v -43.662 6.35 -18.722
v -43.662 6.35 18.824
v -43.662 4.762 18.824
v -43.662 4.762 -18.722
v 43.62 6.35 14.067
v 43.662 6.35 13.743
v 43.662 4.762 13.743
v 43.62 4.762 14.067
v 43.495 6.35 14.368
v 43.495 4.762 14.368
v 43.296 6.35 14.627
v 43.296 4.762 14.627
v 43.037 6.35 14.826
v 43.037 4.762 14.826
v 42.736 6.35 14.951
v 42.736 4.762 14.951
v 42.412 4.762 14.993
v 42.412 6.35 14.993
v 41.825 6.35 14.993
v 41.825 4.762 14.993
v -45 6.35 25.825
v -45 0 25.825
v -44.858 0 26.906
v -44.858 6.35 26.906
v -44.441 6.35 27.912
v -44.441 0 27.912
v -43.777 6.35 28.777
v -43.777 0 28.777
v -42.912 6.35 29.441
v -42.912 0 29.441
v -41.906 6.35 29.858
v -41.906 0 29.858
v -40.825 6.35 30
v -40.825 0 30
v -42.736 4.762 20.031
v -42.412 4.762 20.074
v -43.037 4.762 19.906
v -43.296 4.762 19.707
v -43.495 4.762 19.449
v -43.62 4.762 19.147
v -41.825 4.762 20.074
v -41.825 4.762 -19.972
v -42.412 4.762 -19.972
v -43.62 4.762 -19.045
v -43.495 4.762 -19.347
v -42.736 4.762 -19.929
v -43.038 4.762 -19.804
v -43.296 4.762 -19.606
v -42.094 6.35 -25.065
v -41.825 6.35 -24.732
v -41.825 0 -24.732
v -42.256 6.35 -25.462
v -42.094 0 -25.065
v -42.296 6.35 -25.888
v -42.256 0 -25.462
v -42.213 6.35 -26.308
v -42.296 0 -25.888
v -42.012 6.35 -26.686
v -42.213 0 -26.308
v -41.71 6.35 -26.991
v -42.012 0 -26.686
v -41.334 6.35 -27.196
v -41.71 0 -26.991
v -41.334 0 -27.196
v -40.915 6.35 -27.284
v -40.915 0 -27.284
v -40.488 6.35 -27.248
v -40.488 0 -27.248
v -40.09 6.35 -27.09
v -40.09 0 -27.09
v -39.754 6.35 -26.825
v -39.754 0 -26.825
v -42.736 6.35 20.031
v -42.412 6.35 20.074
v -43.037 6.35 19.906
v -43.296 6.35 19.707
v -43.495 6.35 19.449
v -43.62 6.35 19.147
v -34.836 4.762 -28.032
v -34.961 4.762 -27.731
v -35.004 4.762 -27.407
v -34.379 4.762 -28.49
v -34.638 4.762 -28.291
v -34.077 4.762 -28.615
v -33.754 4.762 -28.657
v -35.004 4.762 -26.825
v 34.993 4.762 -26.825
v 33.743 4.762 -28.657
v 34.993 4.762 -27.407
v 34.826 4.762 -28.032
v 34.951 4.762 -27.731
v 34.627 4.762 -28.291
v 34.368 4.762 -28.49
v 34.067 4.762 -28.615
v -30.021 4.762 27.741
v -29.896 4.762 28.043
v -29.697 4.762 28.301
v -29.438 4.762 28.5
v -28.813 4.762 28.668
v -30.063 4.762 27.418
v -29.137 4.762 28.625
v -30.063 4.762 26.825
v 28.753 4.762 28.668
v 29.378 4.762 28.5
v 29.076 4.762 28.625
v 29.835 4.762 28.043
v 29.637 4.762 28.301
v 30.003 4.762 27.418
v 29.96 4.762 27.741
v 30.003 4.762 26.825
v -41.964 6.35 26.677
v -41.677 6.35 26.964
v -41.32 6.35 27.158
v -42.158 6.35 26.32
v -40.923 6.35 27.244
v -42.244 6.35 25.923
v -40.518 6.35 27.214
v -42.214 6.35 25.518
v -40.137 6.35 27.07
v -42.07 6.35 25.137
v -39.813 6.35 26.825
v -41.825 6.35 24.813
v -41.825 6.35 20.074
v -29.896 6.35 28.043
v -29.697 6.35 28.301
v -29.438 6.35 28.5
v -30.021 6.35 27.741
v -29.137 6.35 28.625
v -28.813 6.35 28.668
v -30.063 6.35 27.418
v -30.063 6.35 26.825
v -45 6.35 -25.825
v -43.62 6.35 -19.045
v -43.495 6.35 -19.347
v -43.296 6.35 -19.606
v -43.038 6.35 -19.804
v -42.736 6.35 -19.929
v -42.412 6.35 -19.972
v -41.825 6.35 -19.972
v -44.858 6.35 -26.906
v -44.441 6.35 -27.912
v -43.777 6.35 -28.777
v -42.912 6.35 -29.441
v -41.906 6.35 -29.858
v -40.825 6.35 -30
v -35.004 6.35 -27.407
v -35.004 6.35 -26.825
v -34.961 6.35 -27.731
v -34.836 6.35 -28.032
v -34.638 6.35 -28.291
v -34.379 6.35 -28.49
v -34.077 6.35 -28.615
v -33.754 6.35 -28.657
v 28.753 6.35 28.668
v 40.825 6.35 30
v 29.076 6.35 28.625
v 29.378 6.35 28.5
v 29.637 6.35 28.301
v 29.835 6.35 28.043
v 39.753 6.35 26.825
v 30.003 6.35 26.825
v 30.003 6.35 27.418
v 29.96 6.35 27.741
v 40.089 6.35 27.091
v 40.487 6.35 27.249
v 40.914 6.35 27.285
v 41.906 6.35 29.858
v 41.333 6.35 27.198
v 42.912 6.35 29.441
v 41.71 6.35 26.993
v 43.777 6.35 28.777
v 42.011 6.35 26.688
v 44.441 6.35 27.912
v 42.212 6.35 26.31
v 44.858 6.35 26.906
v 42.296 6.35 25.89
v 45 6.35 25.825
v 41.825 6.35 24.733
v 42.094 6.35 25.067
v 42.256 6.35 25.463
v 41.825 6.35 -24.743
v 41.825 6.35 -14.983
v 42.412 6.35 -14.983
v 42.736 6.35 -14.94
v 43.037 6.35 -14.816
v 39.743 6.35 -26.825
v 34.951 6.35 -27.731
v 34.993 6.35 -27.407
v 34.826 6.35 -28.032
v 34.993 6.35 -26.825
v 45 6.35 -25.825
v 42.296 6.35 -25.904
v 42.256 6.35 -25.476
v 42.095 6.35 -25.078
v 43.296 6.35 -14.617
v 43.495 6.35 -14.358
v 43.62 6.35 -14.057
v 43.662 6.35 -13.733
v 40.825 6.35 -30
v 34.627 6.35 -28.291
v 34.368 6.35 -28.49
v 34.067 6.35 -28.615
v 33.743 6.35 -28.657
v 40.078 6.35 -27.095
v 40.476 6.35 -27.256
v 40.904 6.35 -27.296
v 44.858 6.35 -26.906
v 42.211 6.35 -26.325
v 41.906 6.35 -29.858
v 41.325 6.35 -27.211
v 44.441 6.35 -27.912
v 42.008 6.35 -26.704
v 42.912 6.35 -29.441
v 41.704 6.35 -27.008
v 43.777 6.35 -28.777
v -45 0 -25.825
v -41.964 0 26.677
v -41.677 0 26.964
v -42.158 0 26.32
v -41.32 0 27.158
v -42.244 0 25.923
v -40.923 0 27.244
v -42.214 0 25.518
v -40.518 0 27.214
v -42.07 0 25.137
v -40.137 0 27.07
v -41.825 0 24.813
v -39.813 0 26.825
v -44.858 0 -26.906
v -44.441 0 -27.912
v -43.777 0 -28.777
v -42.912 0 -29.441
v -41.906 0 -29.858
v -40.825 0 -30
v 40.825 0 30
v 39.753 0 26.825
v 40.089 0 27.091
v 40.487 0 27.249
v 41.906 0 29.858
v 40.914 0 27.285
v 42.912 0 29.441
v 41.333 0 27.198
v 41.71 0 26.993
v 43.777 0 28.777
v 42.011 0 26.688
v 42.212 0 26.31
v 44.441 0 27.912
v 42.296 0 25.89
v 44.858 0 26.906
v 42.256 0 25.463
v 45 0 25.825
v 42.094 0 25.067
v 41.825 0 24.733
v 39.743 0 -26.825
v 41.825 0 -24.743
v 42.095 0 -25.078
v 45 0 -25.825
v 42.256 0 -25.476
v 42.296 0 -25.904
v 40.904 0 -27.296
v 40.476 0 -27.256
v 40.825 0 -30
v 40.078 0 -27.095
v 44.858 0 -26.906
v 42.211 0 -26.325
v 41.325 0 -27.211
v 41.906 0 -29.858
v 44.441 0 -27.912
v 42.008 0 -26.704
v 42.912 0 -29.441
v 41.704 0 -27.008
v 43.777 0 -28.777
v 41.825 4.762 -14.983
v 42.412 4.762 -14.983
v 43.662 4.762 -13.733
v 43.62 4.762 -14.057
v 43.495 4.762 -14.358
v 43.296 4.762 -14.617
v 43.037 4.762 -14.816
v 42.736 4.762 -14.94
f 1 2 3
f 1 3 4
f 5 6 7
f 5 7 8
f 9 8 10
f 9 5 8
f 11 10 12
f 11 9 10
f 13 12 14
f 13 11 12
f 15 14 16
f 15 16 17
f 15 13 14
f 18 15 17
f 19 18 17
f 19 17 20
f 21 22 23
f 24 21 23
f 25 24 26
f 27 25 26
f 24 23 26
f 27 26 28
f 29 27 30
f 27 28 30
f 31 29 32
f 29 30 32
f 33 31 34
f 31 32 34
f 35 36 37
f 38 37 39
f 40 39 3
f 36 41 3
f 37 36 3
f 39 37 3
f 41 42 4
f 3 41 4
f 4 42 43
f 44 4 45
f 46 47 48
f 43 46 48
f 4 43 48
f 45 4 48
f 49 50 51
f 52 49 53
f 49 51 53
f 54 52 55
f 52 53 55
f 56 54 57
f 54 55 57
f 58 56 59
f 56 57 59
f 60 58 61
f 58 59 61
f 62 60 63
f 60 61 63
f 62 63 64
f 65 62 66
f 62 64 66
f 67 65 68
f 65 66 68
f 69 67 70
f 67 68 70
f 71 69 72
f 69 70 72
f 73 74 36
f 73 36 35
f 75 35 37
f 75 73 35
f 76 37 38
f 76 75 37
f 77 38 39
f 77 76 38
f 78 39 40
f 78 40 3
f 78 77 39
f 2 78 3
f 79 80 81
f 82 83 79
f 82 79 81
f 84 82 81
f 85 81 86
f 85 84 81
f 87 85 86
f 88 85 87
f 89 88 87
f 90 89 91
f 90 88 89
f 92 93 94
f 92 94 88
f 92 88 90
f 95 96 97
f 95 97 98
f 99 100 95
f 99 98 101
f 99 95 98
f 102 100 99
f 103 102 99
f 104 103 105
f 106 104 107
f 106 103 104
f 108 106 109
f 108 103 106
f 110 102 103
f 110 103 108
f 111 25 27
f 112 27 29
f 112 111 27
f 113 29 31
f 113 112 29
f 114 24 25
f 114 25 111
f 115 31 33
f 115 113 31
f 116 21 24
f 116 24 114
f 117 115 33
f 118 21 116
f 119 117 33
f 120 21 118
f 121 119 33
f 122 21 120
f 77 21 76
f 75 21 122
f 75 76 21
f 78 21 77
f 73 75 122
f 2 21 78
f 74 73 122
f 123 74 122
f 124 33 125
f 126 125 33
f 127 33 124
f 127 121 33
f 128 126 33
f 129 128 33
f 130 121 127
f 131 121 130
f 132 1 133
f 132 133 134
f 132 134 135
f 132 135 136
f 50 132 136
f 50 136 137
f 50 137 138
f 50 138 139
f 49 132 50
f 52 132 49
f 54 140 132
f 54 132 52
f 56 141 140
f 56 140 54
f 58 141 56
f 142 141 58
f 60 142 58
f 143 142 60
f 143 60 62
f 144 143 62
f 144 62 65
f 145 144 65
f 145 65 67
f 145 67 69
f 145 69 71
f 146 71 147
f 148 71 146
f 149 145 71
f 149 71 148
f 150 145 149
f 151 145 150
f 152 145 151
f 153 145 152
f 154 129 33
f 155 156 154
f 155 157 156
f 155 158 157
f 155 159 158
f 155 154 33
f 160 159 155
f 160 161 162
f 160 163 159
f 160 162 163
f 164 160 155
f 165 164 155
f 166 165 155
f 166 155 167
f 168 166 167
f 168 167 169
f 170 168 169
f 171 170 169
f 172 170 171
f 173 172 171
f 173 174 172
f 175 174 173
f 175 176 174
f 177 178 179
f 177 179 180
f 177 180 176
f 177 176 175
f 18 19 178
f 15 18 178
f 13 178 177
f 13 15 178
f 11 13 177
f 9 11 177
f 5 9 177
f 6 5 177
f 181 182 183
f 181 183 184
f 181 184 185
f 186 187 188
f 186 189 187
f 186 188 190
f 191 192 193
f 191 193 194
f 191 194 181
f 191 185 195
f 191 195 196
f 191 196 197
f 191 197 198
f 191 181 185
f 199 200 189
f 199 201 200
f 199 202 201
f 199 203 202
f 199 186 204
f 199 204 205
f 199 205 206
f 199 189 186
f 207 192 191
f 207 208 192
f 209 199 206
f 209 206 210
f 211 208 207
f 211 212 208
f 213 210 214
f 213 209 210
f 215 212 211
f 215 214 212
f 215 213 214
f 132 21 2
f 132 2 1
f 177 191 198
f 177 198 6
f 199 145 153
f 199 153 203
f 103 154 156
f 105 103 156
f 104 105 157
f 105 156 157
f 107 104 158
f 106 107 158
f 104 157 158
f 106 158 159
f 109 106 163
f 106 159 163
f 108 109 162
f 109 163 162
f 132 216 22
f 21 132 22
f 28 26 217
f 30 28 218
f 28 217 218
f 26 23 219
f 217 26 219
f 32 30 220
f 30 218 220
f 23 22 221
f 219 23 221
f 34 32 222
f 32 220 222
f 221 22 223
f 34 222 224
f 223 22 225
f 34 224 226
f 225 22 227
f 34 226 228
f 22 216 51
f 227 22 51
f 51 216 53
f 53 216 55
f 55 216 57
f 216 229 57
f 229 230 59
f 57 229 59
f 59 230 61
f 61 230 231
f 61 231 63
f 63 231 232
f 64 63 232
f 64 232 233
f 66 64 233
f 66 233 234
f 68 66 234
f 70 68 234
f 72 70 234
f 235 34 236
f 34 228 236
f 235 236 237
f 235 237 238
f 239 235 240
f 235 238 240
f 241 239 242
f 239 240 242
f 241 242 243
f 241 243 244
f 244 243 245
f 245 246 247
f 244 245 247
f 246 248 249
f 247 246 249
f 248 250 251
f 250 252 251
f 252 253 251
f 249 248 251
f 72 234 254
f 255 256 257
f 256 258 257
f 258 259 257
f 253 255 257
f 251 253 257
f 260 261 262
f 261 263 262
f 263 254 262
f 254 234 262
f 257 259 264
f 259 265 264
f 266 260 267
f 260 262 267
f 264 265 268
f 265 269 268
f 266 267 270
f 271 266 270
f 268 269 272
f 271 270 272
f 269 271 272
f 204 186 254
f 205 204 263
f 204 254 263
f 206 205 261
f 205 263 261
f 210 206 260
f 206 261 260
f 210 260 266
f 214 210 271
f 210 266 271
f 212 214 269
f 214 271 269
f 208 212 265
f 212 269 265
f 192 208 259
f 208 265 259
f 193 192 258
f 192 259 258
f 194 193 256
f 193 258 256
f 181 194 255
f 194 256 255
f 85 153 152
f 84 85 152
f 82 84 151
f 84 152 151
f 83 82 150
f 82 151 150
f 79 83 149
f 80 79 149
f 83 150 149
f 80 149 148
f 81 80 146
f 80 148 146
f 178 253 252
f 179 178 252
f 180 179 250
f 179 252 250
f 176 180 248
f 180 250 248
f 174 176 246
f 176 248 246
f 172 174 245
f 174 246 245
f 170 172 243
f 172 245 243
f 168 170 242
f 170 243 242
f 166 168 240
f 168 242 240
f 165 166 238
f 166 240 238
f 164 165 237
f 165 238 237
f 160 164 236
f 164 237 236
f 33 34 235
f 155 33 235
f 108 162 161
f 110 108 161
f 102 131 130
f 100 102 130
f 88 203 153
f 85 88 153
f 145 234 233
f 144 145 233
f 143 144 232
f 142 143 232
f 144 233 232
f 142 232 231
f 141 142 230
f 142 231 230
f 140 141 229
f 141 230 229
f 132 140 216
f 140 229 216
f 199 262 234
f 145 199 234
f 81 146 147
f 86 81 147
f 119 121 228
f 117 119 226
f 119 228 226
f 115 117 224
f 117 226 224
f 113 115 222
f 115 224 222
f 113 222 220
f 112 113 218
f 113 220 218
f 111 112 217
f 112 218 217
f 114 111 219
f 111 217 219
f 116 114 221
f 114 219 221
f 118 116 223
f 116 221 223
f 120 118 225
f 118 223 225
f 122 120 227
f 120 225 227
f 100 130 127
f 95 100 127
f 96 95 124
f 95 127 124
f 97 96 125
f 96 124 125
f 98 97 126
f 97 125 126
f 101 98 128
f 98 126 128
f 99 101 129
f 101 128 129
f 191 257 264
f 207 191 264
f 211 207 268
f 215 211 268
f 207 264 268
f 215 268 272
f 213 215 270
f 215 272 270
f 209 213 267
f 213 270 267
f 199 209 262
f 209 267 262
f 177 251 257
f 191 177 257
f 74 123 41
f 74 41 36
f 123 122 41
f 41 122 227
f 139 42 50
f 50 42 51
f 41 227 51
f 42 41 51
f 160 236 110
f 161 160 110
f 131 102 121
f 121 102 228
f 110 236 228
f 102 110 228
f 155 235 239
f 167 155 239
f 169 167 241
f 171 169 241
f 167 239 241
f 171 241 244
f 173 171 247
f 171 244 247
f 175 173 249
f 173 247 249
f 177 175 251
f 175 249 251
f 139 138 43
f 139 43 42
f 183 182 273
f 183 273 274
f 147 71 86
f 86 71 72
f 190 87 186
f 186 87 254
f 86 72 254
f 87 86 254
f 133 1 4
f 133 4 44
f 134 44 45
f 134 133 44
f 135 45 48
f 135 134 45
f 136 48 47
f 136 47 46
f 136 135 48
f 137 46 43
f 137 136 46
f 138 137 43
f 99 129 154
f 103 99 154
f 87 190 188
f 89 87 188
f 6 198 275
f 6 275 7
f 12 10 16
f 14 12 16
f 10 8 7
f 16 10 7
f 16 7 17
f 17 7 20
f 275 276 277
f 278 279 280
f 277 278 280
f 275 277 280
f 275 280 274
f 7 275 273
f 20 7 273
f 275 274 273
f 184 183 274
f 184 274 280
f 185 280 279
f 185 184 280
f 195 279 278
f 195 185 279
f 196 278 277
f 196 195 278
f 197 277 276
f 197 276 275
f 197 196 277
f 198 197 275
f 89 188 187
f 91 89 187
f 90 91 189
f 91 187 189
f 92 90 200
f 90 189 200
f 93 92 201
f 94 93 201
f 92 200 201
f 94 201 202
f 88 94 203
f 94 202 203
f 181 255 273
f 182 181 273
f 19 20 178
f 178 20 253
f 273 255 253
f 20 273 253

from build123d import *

# Parameters (mm, degrees)
BOSS_EXTRUDE3_DEPTH = 6.35
SKETCH5_R           = 1.4224
SKETCH5_R_2         = 1.4732
CUT_EXTRUDE2_DEPTH  = 55.454774814
CUT_EXTRUDE3_DEPTH  = 1.5875


with BuildPart() as part:
    # Sketch2 → Boss-Extrude3 (new body)
    with BuildSketch(Plane(origin=(0, 0, 0), x_dir=(1, 0, 0), z_dir=(0, 1, 0))):
        with BuildLine():
            Line((-45, 25.825), (-45, -25.825))
            ThreePointArc((-45, -25.825), (-43.777170811, -28.777170811), (-40.825, -30))
            Line((-40.825, -30), (40.825, -30))
            ThreePointArc((40.825, -30), (43.777170811, -28.777170811), (45, -25.825))
            Line((45, -25.825), (45, 25.825))
            ThreePointArc((45, 25.825), (43.777170811, 28.777170811), (40.825, 30))
            Line((40.825, 30), (-40.825, 30))
            ThreePointArc((-40.825, 30), (-43.777170811, 28.777170811), (-45, 25.825))
        make_face()
        with BuildLine():
            Line((-41.825, -25.825), (-41.825, 25.825))
            ThreePointArc((-41.825, 25.825), (-41.532106781, 26.532106781), (-40.825, 26.825))
            Line((-40.825, 26.825), (40.825, 26.825))
            ThreePointArc((40.825, 26.825), (41.532106781, 26.532106781), (41.825, 25.825))
            Line((41.825, 25.825), (41.825, -25.825))
            ThreePointArc((41.825, -25.825), (41.532106781, -26.532106781), (40.825, -26.825))
            Line((40.825, -26.825), (-40.825, -26.825))
            ThreePointArc((-40.825, -26.825), (-41.532106781, -26.532106781), (-41.825, -25.825))
        make_face(mode=Mode.SUBTRACT)
    extrude(amount=BOSS_EXTRUDE3_DEPTH)

    # Sketch5 → Cut-Extrude2 (cut, through all)
    with BuildSketch(Plane.XZ):
        with Locations((-40.825, 25.825)):
            Circle(SKETCH5_R)
        with Locations((40.825, 25.81487963)):
            Circle(SKETCH5_R_2)
        with Locations((40.825, -25.825)):
            Circle(SKETCH5_R_2)
        with Locations((-40.825, -25.81356336)):
            Circle(SKETCH5_R_2)
    extrude(amount=-CUT_EXTRUDE2_DEPTH, mode=Mode.SUBTRACT)

    # Sketch7 → Cut-Extrude3 (cut)
    with BuildSketch(Plane(origin=(0, 6.35, 0), x_dir=(1, 0, 0), z_dir=(0, 1, 0))):
        with BuildLine():
            Line((-35.00387248, 27.407439815), (-35.00387248, 25.81487963))
            Line((-35.00387248, 25.81487963), (34.993187521, 25.81487963))
            Line((34.993187521, 25.81487963), (34.993187521, 27.407439815))
            ThreePointArc((34.993187521, 27.407439815), (34.627070997, 28.291323292), (33.743187521, 28.657439815))
            Line((33.743187521, 28.657439815), (-33.75387248, 28.657439815))
            ThreePointArc((-33.75387248, 28.657439815), (-34.637755957, 28.291323292), (-35.00387248, 27.407439815))
        make_face()
        with BuildLine():
            Line((-43.6625, -18.823576125), (-43.6625, 18.721630511))
            ThreePointArc((-43.6625, 18.721630511), (-43.296383476, 19.605513988), (-42.4125, 19.971630511))
            Line((-42.4125, 19.971630511), (-40.825, 19.971630511))
            Line((-40.825, 19.971630511), (-40.825, -20.073576125))
            Line((-40.825, -20.073576125), (-42.4125, -20.073576125))
            ThreePointArc((-42.4125, -20.073576125), (-43.296383476, -19.707459601), (-43.6625, -18.823576125))
        make_face()
        with BuildLine():
            Line((40.825, 14.983067151), (42.4125, 14.983067151))
            ThreePointArc((42.4125, 14.983067151), (43.296383476, 14.616950627), (43.6625, 13.733067151))
            Line((43.6625, 13.733067151), (43.6625, -13.743187521))
            ThreePointArc((43.6625, -13.743187521), (43.296383476, -14.627070997), (42.4125, -14.993187521))
            Line((42.4125, -14.993187521), (40.825, -14.993187521))
            Line((40.825, -14.993187521), (40.825, 14.983067151))
        make_face()
        with BuildLine():
            Line((-28.813455755, -28.667560185), (28.75263109, -28.667560185))
            ThreePointArc((28.75263109, -28.667560185), (29.636514567, -28.301443661), (30.00263109, -27.417560185))
            Line((30.00263109, -27.417560185), (30.00263109, -25.83512037))
            Line((30.00263109, -25.83512037), (-30.063455755, -25.83512037))
            Line((-30.063455755, -25.83512037), (-30.063455755, -27.417560185))
            ThreePointArc((-30.063455755, -27.417560185), (-29.697339231, -28.301443661), (-28.813455755, -28.667560185))
        make_face()
    extrude(amount=-CUT_EXTRUDE3_DEPTH, mode=Mode.SUBTRACT)


solid = part.part
